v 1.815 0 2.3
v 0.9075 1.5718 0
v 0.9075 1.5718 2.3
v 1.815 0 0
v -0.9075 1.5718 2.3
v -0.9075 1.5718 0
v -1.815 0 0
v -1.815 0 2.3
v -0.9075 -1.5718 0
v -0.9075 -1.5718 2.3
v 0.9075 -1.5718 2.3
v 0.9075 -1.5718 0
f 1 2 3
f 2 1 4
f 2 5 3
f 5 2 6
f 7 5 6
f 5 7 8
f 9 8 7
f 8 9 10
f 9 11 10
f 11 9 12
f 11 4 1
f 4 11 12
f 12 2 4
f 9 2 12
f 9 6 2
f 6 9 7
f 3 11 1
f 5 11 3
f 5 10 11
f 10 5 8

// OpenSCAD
// file: wall-commons.scad
include <carousel-config.scad>;

FX = FACE_WIDTH/2;
FY = FACE_HEIGHT;
FF = 0.85;

BEAM_SIZE = 1.1 * FACE_THICKNESS;

STRUT_OVERRUN = 0.25 * FACE_THICKNESS;

STRUTS_COLOR = "SaddleBrown";

// for mounting struts on core
STRUT_DZ = FACE_THICKNESS/2 + STRUT_OVERRUN + EASE;

module door_shape(width, height, thickness, ground_bleed = 0) {
    radius = width/2;
    straight_height = height - radius;

    translate([0, straight_height, 0])
        cylinder(h = thickness, r = radius, center = true);
    translate([0, (straight_height - ground_bleed)/2, 0])
        cube([width, straight_height + ground_bleed, thickness], center = true);
}
// file: carousel-config.scad
// ----------------------------------------------------------------------------
// Configuration of the carousel and its components.
//
// All the values beyod "---- derived" string in each of the sections should
// not be modified manually, as they are derived from the previously defined
// parameters in some way...
// ----------------------------------------------------------------------------

// Generic parameters to address consistency & interconnections of parts.
CYL_FN = 32; // BEWARE!!! set to +- 256 for STL export!
BLEED = 0.5; // overlap for union & difference operations
EASE = 0.2; // socket/pin ease for interconnecting of parts & holes

// Core defining shape of our carousel is N-faced cylinder.
// This affects most of the subsequent parameter definitions & usage.
CAROUSEL_FACE_COUNT = 6;
CAROUSEL_ESCRIBED_RADIUS = 120;
// ---- derived
CAROUSEL_INSCRIBED_RADIUS = CAROUSEL_ESCRIBED_RADIUS * cos(180/CAROUSEL_FACE_COUNT);

// Base of the carousel -> stand that holds the axle, walls, etc.
BASE_TOTAL_HEIGHT = 24;
BASE_FLOOR_THICKNESS = 4;
BASE_WALL_THICKNESS = 4;

// Face, or, a wall of the carousel "shell".
FACE_HEIGHT = 150;
FACE_THICKNESS = 5;
// ---- derived
FACE_WIDTH = CAROUSEL_ESCRIBED_RADIUS * 2 * sin(180/CAROUSEL_FACE_COUNT);
FACE_ANGLE = (1 - 2/CAROUSEL_FACE_COUNT)*180;
FACE_APOTHEM_LEN = FACE_WIDTH / (2 * tan(180/CAROUSEL_FACE_COUNT));
FACE_DOOR_HEIGHT = 0.66 * FACE_HEIGHT;
FACE_DOOR_WIDTH = 0.75 * FACE_WIDTH;

// Roof of the carousel.
ROOF_THICKNESS = 2;
ROOF_HEIGHT = 1.3 * FACE_HEIGHT;

// Ball bearing - real-life dimensions of ball bearing used to "power" the axle.
BEARING_OUTER_D = 22;
BEARING_INNER_D = 8;
BEARING_HEIGHT = 7;
BEARING_SHELL_THICKNESS = 2;

// Axle rotating inside carousel.
AXLE_RADIUS = 4;

// Rotating rig carrying the seats.
RIG_HEIGHT = 6;
RIG_STR = 6;

// Abstract "rings" carrying seats, and their distance off the carousel center
// as a fraction of radius.
RIG_RING_POSITIONS = [0.3, 0.6, 0.9];
RIG_MAX_R = 0.90 * CAROUSEL_INSCRIBED_RADIUS;
// main file
include <carousel-config.scad>;
include <wall-commons.scad>;

// positions of the pegs connecting the wooden struts and wall core
PEG_X = FX - 1.5 * BEAM_SIZE;
PEG_Y1 = FACE_DOOR_HEIGHT - BEAM_SIZE/2;
PEG_Y2 = (FY + FACE_DOOR_HEIGHT)/2;
PEG_Y3 = FACE_DOOR_HEIGHT - FACE_DOOR_WIDTH/2;

function peg_points() = [
    [0, FY - BEAM_SIZE],
    [0, 0.5 * (PEG_Y1 + PEG_Y2)],
    [PEG_X, PEG_Y1],
    [PEG_X, PEG_Y2],
    [PEG_X, PEG_Y3],
    [-PEG_X, PEG_Y1],
    [-PEG_X, PEG_Y2],
    [-PEG_X, PEG_Y3],
];

module strut_peg(height) {
    PEG_DIAMETER = 0.66 * BEAM_SIZE;
    cylinder(h = height, d = PEG_DIAMETER);
}

strut_peg(FACE_THICKNESS/2-EASE);
